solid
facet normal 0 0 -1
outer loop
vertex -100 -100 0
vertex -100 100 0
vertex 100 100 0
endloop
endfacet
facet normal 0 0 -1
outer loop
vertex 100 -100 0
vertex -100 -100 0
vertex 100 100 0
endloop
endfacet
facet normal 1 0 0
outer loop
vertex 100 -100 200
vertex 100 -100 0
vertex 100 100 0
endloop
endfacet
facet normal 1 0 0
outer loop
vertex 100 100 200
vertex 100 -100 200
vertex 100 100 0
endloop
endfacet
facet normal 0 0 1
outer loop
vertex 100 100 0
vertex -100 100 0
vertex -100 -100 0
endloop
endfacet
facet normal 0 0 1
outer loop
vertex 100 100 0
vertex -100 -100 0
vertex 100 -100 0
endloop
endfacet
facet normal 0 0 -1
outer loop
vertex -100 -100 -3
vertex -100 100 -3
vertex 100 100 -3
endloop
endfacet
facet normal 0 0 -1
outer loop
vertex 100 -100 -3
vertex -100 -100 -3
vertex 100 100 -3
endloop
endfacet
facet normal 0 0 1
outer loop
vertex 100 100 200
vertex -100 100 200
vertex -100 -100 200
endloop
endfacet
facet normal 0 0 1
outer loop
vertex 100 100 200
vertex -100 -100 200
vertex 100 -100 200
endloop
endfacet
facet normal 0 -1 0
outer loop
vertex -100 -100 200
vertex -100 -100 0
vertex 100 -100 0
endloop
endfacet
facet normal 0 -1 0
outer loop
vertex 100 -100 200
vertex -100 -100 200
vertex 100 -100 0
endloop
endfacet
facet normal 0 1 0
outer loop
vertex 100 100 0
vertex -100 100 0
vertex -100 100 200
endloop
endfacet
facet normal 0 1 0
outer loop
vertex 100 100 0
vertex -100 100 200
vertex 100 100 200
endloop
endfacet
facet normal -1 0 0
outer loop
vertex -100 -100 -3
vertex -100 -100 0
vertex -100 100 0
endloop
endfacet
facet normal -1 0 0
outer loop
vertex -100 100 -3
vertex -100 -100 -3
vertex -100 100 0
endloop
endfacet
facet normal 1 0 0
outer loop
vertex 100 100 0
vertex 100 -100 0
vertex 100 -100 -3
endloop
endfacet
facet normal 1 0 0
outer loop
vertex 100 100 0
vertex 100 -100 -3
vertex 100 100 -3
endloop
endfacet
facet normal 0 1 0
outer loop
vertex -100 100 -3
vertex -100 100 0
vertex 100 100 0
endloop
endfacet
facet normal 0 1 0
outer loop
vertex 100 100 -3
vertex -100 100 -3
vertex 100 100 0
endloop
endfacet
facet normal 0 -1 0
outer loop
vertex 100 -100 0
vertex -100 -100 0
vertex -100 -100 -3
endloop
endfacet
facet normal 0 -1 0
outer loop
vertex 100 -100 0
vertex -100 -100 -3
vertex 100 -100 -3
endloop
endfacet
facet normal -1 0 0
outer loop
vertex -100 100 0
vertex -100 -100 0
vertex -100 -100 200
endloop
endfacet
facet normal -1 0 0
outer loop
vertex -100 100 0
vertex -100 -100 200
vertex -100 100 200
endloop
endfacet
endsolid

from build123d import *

# Parameters (mm, degrees)
F0_W      = 200
F0_H      = 200
F1_DEPTH  = 3
F1_FACE_W = 200
F1_FACE_H = 200
F2_DEPTH  = 200


with BuildPart() as f1:
    # F0 (on Top) → F1 (new body)
    with BuildSketch(Plane.XY):
        Rectangle(F0_W, F0_H)
    extrude(amount=-F1_DEPTH)


with BuildPart() as f2:
    # F1_face (on face) → F2 (new body)
    with BuildSketch(Plane.XY):
        Rectangle(F1_FACE_W, F1_FACE_H)
    extrude(amount=F2_DEPTH)


solid = Compound([f1.part, f2.part])
